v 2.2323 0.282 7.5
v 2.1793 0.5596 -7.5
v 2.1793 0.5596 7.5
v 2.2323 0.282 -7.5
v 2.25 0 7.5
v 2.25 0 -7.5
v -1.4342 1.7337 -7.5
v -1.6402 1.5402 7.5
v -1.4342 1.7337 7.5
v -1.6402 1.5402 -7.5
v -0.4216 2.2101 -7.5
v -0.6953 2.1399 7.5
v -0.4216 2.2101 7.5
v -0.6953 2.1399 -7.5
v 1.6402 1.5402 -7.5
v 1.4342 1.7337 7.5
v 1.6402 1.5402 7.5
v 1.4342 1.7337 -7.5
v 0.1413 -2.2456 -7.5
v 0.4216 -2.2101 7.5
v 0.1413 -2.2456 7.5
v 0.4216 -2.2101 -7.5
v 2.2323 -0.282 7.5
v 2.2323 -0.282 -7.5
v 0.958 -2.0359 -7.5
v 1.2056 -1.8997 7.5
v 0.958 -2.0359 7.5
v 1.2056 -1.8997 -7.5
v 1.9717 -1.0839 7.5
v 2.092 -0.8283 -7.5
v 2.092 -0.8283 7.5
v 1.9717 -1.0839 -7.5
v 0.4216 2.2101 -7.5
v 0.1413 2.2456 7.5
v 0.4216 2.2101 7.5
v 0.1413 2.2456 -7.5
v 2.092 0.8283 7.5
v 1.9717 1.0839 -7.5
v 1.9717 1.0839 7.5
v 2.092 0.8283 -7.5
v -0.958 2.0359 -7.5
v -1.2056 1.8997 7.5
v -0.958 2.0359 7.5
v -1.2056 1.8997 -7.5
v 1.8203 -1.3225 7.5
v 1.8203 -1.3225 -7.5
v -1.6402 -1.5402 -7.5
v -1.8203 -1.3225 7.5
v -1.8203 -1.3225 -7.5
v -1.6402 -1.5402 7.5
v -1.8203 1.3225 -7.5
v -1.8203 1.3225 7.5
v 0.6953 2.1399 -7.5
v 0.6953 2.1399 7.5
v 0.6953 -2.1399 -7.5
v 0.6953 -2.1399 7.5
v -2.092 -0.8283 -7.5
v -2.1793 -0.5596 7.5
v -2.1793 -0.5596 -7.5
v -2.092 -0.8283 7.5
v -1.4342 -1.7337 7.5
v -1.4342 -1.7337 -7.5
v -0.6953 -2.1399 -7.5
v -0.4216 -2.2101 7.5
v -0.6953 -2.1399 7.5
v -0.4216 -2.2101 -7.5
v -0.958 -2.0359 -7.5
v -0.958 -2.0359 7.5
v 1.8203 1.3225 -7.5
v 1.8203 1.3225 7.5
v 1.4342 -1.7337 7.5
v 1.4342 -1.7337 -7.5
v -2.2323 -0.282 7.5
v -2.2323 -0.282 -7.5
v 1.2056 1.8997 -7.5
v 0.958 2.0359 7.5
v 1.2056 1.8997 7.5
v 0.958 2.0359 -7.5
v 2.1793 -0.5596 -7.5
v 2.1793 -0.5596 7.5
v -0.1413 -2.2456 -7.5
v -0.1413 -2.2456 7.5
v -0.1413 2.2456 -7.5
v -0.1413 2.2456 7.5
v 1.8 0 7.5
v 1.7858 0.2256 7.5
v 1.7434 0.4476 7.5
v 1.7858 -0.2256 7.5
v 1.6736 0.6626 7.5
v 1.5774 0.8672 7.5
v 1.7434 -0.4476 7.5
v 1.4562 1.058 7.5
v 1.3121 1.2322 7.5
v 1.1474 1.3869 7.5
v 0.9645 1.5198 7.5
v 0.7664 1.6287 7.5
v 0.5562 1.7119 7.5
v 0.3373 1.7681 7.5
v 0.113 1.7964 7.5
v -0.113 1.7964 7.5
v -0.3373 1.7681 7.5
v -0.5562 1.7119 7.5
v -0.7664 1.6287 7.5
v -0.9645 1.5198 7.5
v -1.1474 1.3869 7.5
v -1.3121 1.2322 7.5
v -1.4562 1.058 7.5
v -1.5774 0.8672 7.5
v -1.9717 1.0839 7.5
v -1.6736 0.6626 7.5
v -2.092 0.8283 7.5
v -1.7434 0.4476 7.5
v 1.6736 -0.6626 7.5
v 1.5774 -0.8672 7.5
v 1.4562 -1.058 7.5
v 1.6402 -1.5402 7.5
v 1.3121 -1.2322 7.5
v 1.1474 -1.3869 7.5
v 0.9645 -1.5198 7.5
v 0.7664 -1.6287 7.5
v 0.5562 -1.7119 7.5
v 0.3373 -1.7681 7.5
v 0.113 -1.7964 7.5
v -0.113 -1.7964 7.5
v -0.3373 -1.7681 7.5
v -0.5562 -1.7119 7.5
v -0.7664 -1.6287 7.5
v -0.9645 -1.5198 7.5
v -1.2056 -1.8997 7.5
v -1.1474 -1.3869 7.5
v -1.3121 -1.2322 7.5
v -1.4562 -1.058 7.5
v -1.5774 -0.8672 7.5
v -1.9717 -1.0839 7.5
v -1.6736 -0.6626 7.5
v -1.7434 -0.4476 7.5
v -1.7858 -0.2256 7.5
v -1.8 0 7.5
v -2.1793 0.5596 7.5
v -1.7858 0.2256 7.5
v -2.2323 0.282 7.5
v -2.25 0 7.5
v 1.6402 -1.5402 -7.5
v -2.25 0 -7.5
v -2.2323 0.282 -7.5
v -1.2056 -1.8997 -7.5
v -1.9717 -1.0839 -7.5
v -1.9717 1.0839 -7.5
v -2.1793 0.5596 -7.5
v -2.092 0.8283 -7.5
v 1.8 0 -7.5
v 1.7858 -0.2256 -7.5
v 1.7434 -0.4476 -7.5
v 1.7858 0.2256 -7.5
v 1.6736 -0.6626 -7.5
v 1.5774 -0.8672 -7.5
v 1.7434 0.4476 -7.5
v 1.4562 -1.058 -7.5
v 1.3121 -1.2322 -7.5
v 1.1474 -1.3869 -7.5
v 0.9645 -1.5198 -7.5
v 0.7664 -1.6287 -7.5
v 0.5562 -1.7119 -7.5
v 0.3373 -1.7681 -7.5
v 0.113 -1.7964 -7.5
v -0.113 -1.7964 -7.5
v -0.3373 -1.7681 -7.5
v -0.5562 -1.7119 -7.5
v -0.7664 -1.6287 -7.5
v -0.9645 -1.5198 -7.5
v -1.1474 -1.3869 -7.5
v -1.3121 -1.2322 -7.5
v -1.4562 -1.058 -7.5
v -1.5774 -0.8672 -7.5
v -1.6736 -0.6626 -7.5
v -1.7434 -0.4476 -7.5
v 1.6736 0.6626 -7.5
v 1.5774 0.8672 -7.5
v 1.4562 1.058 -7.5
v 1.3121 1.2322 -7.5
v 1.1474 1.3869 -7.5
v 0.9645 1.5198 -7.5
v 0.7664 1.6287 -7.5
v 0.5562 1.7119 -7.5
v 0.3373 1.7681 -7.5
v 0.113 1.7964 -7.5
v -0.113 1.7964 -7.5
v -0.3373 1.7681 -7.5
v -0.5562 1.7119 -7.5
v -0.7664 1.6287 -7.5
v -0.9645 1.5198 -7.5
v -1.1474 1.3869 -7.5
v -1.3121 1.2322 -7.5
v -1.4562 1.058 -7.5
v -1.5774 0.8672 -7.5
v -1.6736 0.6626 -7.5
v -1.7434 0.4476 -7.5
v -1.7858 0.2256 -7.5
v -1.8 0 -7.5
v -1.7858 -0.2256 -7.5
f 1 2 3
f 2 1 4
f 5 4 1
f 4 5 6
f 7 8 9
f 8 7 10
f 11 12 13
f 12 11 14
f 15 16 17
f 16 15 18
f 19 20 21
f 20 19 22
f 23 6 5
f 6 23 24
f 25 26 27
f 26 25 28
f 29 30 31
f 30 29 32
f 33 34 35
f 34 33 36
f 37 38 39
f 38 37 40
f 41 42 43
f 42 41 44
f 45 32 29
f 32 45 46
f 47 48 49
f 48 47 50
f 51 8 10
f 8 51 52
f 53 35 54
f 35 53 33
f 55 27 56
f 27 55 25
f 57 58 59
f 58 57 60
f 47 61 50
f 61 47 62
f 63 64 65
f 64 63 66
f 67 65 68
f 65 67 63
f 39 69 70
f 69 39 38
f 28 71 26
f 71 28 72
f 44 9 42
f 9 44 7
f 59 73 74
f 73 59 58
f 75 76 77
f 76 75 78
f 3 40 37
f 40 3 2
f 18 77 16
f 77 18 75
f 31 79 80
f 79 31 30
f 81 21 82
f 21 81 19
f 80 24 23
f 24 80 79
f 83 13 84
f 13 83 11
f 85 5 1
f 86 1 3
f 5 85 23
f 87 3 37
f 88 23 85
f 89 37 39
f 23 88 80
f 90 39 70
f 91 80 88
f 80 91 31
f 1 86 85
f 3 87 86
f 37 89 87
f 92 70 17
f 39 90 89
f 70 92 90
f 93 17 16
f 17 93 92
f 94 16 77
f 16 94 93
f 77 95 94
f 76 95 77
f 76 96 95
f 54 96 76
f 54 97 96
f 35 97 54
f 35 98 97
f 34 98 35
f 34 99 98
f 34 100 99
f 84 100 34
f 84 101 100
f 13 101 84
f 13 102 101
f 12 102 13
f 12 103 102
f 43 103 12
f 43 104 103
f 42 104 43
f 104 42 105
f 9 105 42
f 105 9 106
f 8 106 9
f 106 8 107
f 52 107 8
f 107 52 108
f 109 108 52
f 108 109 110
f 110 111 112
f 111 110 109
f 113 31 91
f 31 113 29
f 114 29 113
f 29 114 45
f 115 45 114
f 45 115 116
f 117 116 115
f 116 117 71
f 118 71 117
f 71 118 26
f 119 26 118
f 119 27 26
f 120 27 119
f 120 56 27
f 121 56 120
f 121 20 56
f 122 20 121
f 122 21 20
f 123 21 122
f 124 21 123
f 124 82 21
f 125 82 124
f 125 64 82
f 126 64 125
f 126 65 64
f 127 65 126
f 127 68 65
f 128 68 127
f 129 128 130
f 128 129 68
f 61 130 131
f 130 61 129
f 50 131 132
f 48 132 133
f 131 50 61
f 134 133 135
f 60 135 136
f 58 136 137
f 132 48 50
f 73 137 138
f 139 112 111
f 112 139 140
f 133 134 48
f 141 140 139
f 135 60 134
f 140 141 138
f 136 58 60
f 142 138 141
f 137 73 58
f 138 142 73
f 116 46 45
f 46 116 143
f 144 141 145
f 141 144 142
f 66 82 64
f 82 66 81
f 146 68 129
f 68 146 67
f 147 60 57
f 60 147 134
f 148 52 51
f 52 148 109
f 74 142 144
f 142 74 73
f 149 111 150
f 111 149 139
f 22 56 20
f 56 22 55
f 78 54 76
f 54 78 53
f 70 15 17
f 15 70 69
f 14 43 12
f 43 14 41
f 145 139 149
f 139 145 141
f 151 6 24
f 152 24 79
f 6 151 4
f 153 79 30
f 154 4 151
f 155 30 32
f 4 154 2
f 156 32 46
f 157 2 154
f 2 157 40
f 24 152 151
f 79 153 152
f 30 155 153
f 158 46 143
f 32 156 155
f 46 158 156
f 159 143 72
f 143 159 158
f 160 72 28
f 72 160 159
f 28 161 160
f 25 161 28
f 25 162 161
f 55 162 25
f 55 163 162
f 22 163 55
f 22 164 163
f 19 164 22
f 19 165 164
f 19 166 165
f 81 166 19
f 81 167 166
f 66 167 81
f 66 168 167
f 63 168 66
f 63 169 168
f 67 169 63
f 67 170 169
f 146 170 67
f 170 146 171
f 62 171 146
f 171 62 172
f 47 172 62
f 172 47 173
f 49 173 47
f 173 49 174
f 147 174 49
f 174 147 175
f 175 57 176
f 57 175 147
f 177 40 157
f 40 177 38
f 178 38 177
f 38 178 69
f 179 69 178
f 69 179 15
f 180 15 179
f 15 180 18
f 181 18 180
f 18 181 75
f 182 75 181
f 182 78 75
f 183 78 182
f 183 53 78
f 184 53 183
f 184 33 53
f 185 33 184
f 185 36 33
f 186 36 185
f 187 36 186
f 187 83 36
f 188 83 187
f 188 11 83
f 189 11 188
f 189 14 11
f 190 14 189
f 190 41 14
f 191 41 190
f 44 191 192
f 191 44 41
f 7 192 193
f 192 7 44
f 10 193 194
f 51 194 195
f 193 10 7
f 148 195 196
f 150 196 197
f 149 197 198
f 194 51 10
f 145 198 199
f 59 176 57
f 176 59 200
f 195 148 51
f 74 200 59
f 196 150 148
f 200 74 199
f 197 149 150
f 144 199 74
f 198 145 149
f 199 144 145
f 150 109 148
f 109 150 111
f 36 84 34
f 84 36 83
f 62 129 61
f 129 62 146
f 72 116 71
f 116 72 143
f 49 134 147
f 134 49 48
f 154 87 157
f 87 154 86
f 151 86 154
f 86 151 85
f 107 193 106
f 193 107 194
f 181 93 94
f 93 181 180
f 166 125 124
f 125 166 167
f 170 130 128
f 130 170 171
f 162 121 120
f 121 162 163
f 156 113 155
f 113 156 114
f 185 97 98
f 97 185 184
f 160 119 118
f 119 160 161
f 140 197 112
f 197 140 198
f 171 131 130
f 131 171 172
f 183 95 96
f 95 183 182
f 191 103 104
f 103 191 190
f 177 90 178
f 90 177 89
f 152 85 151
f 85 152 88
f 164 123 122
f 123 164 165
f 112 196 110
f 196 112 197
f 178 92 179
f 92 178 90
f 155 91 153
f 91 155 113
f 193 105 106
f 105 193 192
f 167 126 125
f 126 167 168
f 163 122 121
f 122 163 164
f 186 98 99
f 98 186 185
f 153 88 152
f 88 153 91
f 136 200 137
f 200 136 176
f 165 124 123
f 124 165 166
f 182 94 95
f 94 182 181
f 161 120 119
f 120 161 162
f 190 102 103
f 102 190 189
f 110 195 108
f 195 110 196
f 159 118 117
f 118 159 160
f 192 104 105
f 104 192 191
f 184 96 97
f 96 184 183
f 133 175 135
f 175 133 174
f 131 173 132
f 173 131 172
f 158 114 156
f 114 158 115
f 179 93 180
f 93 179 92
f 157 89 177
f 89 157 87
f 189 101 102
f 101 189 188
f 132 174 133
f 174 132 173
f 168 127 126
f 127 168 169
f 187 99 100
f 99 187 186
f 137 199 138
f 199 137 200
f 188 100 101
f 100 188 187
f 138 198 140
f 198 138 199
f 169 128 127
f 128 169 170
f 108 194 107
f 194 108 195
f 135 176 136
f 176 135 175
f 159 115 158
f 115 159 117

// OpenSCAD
$fn = 50;


difference() {
	union() {
		translate(v = [0, 0, -7.5000000000]) {
			cylinder(h = 15, r = 2.2500000000);
		}
	}
	union() {
		#translate(v = [0, 0, -100.0000000000]) {
			cylinder(h = 200, r = 1.8000000000);
		}
	}
}
